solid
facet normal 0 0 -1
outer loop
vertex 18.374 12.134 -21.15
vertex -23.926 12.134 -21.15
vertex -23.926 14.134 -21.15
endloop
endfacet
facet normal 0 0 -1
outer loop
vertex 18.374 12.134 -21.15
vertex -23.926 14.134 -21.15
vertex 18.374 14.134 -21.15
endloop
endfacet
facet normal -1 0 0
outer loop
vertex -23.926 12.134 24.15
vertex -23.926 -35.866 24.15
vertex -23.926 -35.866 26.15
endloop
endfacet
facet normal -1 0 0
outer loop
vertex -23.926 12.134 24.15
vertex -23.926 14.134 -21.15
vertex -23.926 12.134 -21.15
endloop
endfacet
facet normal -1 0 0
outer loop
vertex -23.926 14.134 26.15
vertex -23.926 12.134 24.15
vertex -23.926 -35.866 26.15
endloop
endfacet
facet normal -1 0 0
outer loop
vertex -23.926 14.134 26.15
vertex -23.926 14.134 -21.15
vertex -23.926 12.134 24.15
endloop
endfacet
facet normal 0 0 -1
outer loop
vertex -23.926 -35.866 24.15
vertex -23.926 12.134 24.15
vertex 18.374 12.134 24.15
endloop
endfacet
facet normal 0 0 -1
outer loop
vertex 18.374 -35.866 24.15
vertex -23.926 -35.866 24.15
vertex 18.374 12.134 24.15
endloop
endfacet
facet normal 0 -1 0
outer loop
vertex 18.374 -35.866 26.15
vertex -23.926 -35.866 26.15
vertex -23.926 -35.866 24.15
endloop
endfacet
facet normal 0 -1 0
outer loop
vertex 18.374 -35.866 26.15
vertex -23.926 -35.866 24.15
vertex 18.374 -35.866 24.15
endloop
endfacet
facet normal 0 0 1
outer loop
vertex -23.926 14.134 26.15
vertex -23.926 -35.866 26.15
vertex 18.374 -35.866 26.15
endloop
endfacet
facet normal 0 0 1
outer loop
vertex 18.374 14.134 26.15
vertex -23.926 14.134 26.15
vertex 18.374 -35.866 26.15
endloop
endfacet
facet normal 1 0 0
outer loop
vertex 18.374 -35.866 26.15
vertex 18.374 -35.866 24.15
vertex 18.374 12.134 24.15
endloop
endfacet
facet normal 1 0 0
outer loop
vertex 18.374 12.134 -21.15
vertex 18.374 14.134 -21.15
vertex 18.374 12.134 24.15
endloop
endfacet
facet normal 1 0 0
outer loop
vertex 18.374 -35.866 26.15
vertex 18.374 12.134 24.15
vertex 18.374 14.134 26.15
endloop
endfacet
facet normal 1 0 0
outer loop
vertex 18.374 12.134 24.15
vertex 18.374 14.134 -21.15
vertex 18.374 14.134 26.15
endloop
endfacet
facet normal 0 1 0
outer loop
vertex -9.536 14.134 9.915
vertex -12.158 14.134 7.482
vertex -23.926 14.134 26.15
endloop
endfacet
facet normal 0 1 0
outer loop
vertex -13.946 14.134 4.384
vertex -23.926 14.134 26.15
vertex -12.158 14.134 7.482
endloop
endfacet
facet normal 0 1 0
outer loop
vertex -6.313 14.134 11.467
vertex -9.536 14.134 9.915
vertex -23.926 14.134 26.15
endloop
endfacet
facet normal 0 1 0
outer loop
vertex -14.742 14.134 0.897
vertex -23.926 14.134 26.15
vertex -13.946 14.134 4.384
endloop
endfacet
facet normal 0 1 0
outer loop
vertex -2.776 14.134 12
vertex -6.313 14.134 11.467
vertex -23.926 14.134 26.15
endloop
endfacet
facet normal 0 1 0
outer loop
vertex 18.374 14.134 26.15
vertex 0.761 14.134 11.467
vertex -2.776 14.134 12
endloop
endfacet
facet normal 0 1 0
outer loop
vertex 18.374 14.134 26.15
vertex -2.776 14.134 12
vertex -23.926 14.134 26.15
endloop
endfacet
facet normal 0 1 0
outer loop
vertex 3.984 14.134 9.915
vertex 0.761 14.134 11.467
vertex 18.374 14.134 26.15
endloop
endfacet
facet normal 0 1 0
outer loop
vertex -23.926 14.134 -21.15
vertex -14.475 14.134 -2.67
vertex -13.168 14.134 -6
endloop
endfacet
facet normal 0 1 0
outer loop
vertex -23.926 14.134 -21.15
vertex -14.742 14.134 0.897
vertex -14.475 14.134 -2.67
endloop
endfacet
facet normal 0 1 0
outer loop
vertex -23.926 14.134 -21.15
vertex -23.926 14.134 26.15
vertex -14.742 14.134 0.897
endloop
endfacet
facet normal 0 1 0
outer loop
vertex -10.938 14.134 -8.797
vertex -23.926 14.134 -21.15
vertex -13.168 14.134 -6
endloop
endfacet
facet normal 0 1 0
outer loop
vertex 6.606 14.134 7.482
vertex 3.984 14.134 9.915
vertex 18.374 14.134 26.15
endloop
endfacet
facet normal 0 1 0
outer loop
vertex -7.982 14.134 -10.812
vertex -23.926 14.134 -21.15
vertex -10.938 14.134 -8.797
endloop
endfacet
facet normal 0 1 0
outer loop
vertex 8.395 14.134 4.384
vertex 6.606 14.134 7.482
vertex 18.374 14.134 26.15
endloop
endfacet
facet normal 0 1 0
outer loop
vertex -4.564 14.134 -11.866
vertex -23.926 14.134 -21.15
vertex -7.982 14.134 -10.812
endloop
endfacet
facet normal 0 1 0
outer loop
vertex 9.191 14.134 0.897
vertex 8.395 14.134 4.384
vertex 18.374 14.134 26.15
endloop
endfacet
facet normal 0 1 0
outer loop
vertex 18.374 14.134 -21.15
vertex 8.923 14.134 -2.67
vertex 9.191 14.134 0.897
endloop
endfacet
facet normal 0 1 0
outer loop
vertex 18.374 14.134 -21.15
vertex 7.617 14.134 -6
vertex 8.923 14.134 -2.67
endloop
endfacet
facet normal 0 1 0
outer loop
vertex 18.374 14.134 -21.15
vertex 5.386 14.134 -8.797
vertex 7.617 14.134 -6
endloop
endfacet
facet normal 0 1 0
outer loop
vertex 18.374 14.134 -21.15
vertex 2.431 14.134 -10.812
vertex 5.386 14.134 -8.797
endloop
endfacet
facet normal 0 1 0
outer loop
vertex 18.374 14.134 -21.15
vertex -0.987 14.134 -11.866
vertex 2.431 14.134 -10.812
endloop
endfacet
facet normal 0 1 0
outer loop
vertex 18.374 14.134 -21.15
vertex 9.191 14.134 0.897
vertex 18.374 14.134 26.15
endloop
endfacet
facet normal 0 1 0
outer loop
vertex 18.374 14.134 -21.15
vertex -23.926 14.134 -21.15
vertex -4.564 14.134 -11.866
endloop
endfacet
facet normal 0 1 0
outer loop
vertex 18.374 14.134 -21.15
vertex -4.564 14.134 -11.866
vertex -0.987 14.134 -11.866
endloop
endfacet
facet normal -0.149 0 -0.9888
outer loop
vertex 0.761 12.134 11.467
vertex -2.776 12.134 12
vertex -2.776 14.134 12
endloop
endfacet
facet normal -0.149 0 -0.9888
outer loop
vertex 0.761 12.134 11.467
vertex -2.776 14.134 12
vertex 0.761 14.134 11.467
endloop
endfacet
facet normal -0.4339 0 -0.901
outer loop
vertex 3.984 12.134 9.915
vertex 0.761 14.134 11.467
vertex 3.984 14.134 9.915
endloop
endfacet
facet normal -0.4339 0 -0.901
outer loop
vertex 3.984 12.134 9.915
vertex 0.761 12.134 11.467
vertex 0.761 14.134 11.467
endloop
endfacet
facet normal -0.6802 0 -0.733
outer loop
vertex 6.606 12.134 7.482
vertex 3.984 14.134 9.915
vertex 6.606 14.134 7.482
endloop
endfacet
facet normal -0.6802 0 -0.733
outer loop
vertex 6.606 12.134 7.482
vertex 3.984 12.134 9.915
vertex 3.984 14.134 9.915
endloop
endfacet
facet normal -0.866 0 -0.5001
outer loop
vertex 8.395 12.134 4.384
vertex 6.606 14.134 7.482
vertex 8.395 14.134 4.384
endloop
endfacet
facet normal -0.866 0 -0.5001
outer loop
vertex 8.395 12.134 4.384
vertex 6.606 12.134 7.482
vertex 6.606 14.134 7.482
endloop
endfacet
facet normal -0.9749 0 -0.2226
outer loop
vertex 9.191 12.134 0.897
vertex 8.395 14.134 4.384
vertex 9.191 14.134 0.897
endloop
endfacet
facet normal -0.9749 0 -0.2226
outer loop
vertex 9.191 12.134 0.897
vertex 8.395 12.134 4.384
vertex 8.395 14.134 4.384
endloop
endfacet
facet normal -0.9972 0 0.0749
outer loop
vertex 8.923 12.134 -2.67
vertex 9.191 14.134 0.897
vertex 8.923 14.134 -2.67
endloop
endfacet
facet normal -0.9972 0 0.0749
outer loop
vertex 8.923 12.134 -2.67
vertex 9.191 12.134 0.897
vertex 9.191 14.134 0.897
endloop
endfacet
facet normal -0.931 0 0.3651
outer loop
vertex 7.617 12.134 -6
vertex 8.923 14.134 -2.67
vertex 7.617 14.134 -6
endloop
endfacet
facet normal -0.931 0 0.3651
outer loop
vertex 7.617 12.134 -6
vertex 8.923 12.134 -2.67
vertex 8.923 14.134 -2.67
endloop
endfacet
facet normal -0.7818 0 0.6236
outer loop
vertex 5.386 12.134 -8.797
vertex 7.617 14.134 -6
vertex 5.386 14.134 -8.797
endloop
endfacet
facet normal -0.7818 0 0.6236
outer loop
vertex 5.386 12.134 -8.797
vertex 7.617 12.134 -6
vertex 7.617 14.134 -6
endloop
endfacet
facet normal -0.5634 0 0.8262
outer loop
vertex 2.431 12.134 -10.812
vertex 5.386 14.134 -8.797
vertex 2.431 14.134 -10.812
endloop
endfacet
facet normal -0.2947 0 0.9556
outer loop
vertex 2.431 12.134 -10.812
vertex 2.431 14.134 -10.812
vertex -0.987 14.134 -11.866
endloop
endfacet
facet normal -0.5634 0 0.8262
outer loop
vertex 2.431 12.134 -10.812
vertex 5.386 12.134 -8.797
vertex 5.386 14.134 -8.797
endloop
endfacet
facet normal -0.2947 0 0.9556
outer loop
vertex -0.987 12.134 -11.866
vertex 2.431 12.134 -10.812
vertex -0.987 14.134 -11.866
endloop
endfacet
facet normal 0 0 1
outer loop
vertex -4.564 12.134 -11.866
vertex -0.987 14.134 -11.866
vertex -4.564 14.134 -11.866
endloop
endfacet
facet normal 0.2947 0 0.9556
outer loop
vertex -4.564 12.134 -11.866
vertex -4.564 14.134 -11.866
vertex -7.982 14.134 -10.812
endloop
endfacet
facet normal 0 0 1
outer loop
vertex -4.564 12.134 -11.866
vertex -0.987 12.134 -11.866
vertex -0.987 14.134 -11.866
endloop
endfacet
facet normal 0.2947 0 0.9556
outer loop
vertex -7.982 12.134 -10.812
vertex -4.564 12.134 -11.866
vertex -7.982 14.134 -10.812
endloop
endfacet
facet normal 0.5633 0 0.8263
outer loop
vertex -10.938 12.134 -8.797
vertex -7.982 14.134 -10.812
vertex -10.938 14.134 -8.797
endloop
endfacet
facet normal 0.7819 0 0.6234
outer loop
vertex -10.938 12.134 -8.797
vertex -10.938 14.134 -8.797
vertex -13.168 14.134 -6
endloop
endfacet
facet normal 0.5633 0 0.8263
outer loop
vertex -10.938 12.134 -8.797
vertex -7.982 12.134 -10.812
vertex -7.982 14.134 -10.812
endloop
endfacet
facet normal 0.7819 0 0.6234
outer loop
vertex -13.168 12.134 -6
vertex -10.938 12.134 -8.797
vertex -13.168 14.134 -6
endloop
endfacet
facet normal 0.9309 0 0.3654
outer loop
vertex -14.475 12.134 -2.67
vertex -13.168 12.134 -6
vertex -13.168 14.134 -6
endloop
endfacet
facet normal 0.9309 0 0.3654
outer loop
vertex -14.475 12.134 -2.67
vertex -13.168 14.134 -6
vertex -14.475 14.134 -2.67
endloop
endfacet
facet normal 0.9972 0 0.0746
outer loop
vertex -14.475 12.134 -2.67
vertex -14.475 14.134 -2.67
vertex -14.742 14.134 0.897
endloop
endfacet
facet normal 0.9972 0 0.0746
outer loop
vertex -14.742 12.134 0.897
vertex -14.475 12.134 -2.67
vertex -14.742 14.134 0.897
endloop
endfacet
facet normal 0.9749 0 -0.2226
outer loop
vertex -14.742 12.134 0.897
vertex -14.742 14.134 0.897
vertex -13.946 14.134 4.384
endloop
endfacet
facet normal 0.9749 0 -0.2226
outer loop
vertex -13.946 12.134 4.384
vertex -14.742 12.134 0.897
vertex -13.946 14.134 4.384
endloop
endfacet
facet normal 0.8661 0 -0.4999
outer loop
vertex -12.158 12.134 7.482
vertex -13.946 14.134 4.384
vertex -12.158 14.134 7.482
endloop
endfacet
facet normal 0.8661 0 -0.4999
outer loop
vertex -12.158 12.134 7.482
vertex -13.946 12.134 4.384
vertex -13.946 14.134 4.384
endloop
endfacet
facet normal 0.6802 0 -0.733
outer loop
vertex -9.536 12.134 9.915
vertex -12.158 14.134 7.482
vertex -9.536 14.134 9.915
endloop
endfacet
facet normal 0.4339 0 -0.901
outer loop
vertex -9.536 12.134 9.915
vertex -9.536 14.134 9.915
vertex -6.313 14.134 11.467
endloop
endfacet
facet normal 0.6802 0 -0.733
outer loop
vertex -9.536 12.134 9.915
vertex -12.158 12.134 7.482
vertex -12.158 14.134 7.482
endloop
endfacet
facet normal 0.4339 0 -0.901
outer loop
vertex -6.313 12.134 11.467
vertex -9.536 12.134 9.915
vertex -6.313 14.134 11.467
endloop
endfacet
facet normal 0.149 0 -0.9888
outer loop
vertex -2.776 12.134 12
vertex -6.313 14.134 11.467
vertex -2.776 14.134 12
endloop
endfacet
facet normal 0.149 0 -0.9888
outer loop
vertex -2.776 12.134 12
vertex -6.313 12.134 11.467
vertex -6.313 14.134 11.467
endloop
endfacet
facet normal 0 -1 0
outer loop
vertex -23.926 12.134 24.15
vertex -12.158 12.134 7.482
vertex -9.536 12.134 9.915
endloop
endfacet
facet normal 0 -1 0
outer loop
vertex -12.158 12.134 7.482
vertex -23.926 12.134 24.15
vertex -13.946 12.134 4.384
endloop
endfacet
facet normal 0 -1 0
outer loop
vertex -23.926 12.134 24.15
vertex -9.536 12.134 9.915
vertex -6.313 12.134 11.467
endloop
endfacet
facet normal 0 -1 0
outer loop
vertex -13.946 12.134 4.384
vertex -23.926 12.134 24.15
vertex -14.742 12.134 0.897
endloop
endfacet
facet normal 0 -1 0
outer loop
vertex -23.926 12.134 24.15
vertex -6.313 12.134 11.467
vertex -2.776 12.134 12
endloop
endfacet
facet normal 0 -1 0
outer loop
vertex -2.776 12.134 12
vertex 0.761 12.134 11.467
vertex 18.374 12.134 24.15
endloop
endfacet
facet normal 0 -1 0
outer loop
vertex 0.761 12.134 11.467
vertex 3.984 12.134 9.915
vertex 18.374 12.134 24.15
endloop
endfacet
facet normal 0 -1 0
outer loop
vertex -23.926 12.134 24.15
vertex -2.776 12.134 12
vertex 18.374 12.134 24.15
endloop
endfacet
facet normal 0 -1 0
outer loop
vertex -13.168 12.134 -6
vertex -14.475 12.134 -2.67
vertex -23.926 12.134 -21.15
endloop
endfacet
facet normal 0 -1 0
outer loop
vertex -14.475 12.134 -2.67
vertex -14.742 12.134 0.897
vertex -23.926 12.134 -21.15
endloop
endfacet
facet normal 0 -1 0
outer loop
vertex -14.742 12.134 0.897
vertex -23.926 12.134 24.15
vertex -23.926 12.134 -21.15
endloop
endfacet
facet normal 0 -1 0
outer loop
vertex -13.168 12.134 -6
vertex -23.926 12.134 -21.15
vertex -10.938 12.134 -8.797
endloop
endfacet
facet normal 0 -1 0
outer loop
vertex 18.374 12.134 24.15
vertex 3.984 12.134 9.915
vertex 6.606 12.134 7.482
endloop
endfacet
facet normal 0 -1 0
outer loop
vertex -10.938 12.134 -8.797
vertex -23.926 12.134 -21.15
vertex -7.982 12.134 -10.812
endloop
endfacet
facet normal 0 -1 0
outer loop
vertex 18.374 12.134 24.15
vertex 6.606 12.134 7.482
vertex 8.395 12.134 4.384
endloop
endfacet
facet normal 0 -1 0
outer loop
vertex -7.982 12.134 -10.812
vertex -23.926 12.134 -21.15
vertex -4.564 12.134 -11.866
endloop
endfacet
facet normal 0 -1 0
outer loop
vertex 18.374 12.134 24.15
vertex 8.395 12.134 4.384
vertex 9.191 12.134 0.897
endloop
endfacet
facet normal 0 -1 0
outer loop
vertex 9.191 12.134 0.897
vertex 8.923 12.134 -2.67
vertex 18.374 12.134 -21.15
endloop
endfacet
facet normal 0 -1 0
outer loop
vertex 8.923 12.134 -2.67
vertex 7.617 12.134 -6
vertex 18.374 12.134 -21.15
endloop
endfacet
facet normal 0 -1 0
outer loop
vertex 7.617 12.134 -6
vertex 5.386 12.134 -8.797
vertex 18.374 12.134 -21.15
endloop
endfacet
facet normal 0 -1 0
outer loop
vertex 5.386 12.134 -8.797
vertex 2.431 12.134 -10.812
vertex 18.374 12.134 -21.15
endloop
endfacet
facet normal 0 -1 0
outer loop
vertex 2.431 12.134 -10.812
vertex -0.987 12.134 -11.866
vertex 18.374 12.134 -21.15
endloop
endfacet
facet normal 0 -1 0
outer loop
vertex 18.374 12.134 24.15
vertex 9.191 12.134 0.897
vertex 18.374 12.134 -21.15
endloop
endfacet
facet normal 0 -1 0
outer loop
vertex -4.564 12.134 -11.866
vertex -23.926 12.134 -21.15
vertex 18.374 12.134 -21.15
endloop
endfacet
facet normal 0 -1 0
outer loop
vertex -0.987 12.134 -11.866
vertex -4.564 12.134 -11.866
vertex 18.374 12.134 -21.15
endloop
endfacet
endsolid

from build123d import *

# Parameters (mm, degrees)
SKIZZE1_W                       = 42.3
SKIZZE1_H                       = 47.3
SKIZZE1_R                       = 12
AUFSATZ_LINEAR_AUSTRAGEN1_DEPTH = 2
SKIZZE2_W                       = 42.3
SKIZZE2_H                       = 2
AUFSATZ_LINEAR_AUSTRAGEN2_DEPTH = 48


with BuildPart() as part:
    # Skizze1 → Aufsatz-Linear austragen1 (new body)
    with BuildSketch(Plane(origin=(0, 12.133771831, 0), x_dir=(1, 0, 0), z_dir=(0, 1, 0))):
        with Locations((-2.775765494, -2.5)):
            Rectangle(SKIZZE1_W, SKIZZE1_H)
        with Locations(Location((-2.775765494, 0, 0), (0, 0, 270))):
            Circle(SKIZZE1_R, mode=Mode.SUBTRACT)
    extrude(amount=AUFSATZ_LINEAR_AUSTRAGEN1_DEPTH)

    # Skizze2 → Aufsatz-Linear austragen2 (add)
    with BuildSketch(Plane.XZ.offset(-12.133771831)):
        with Locations((-2.775765494, 25.15)):
            Rectangle(SKIZZE2_W, SKIZZE2_H)
    extrude(amount=AUFSATZ_LINEAR_AUSTRAGEN2_DEPTH)


solid = part.part
